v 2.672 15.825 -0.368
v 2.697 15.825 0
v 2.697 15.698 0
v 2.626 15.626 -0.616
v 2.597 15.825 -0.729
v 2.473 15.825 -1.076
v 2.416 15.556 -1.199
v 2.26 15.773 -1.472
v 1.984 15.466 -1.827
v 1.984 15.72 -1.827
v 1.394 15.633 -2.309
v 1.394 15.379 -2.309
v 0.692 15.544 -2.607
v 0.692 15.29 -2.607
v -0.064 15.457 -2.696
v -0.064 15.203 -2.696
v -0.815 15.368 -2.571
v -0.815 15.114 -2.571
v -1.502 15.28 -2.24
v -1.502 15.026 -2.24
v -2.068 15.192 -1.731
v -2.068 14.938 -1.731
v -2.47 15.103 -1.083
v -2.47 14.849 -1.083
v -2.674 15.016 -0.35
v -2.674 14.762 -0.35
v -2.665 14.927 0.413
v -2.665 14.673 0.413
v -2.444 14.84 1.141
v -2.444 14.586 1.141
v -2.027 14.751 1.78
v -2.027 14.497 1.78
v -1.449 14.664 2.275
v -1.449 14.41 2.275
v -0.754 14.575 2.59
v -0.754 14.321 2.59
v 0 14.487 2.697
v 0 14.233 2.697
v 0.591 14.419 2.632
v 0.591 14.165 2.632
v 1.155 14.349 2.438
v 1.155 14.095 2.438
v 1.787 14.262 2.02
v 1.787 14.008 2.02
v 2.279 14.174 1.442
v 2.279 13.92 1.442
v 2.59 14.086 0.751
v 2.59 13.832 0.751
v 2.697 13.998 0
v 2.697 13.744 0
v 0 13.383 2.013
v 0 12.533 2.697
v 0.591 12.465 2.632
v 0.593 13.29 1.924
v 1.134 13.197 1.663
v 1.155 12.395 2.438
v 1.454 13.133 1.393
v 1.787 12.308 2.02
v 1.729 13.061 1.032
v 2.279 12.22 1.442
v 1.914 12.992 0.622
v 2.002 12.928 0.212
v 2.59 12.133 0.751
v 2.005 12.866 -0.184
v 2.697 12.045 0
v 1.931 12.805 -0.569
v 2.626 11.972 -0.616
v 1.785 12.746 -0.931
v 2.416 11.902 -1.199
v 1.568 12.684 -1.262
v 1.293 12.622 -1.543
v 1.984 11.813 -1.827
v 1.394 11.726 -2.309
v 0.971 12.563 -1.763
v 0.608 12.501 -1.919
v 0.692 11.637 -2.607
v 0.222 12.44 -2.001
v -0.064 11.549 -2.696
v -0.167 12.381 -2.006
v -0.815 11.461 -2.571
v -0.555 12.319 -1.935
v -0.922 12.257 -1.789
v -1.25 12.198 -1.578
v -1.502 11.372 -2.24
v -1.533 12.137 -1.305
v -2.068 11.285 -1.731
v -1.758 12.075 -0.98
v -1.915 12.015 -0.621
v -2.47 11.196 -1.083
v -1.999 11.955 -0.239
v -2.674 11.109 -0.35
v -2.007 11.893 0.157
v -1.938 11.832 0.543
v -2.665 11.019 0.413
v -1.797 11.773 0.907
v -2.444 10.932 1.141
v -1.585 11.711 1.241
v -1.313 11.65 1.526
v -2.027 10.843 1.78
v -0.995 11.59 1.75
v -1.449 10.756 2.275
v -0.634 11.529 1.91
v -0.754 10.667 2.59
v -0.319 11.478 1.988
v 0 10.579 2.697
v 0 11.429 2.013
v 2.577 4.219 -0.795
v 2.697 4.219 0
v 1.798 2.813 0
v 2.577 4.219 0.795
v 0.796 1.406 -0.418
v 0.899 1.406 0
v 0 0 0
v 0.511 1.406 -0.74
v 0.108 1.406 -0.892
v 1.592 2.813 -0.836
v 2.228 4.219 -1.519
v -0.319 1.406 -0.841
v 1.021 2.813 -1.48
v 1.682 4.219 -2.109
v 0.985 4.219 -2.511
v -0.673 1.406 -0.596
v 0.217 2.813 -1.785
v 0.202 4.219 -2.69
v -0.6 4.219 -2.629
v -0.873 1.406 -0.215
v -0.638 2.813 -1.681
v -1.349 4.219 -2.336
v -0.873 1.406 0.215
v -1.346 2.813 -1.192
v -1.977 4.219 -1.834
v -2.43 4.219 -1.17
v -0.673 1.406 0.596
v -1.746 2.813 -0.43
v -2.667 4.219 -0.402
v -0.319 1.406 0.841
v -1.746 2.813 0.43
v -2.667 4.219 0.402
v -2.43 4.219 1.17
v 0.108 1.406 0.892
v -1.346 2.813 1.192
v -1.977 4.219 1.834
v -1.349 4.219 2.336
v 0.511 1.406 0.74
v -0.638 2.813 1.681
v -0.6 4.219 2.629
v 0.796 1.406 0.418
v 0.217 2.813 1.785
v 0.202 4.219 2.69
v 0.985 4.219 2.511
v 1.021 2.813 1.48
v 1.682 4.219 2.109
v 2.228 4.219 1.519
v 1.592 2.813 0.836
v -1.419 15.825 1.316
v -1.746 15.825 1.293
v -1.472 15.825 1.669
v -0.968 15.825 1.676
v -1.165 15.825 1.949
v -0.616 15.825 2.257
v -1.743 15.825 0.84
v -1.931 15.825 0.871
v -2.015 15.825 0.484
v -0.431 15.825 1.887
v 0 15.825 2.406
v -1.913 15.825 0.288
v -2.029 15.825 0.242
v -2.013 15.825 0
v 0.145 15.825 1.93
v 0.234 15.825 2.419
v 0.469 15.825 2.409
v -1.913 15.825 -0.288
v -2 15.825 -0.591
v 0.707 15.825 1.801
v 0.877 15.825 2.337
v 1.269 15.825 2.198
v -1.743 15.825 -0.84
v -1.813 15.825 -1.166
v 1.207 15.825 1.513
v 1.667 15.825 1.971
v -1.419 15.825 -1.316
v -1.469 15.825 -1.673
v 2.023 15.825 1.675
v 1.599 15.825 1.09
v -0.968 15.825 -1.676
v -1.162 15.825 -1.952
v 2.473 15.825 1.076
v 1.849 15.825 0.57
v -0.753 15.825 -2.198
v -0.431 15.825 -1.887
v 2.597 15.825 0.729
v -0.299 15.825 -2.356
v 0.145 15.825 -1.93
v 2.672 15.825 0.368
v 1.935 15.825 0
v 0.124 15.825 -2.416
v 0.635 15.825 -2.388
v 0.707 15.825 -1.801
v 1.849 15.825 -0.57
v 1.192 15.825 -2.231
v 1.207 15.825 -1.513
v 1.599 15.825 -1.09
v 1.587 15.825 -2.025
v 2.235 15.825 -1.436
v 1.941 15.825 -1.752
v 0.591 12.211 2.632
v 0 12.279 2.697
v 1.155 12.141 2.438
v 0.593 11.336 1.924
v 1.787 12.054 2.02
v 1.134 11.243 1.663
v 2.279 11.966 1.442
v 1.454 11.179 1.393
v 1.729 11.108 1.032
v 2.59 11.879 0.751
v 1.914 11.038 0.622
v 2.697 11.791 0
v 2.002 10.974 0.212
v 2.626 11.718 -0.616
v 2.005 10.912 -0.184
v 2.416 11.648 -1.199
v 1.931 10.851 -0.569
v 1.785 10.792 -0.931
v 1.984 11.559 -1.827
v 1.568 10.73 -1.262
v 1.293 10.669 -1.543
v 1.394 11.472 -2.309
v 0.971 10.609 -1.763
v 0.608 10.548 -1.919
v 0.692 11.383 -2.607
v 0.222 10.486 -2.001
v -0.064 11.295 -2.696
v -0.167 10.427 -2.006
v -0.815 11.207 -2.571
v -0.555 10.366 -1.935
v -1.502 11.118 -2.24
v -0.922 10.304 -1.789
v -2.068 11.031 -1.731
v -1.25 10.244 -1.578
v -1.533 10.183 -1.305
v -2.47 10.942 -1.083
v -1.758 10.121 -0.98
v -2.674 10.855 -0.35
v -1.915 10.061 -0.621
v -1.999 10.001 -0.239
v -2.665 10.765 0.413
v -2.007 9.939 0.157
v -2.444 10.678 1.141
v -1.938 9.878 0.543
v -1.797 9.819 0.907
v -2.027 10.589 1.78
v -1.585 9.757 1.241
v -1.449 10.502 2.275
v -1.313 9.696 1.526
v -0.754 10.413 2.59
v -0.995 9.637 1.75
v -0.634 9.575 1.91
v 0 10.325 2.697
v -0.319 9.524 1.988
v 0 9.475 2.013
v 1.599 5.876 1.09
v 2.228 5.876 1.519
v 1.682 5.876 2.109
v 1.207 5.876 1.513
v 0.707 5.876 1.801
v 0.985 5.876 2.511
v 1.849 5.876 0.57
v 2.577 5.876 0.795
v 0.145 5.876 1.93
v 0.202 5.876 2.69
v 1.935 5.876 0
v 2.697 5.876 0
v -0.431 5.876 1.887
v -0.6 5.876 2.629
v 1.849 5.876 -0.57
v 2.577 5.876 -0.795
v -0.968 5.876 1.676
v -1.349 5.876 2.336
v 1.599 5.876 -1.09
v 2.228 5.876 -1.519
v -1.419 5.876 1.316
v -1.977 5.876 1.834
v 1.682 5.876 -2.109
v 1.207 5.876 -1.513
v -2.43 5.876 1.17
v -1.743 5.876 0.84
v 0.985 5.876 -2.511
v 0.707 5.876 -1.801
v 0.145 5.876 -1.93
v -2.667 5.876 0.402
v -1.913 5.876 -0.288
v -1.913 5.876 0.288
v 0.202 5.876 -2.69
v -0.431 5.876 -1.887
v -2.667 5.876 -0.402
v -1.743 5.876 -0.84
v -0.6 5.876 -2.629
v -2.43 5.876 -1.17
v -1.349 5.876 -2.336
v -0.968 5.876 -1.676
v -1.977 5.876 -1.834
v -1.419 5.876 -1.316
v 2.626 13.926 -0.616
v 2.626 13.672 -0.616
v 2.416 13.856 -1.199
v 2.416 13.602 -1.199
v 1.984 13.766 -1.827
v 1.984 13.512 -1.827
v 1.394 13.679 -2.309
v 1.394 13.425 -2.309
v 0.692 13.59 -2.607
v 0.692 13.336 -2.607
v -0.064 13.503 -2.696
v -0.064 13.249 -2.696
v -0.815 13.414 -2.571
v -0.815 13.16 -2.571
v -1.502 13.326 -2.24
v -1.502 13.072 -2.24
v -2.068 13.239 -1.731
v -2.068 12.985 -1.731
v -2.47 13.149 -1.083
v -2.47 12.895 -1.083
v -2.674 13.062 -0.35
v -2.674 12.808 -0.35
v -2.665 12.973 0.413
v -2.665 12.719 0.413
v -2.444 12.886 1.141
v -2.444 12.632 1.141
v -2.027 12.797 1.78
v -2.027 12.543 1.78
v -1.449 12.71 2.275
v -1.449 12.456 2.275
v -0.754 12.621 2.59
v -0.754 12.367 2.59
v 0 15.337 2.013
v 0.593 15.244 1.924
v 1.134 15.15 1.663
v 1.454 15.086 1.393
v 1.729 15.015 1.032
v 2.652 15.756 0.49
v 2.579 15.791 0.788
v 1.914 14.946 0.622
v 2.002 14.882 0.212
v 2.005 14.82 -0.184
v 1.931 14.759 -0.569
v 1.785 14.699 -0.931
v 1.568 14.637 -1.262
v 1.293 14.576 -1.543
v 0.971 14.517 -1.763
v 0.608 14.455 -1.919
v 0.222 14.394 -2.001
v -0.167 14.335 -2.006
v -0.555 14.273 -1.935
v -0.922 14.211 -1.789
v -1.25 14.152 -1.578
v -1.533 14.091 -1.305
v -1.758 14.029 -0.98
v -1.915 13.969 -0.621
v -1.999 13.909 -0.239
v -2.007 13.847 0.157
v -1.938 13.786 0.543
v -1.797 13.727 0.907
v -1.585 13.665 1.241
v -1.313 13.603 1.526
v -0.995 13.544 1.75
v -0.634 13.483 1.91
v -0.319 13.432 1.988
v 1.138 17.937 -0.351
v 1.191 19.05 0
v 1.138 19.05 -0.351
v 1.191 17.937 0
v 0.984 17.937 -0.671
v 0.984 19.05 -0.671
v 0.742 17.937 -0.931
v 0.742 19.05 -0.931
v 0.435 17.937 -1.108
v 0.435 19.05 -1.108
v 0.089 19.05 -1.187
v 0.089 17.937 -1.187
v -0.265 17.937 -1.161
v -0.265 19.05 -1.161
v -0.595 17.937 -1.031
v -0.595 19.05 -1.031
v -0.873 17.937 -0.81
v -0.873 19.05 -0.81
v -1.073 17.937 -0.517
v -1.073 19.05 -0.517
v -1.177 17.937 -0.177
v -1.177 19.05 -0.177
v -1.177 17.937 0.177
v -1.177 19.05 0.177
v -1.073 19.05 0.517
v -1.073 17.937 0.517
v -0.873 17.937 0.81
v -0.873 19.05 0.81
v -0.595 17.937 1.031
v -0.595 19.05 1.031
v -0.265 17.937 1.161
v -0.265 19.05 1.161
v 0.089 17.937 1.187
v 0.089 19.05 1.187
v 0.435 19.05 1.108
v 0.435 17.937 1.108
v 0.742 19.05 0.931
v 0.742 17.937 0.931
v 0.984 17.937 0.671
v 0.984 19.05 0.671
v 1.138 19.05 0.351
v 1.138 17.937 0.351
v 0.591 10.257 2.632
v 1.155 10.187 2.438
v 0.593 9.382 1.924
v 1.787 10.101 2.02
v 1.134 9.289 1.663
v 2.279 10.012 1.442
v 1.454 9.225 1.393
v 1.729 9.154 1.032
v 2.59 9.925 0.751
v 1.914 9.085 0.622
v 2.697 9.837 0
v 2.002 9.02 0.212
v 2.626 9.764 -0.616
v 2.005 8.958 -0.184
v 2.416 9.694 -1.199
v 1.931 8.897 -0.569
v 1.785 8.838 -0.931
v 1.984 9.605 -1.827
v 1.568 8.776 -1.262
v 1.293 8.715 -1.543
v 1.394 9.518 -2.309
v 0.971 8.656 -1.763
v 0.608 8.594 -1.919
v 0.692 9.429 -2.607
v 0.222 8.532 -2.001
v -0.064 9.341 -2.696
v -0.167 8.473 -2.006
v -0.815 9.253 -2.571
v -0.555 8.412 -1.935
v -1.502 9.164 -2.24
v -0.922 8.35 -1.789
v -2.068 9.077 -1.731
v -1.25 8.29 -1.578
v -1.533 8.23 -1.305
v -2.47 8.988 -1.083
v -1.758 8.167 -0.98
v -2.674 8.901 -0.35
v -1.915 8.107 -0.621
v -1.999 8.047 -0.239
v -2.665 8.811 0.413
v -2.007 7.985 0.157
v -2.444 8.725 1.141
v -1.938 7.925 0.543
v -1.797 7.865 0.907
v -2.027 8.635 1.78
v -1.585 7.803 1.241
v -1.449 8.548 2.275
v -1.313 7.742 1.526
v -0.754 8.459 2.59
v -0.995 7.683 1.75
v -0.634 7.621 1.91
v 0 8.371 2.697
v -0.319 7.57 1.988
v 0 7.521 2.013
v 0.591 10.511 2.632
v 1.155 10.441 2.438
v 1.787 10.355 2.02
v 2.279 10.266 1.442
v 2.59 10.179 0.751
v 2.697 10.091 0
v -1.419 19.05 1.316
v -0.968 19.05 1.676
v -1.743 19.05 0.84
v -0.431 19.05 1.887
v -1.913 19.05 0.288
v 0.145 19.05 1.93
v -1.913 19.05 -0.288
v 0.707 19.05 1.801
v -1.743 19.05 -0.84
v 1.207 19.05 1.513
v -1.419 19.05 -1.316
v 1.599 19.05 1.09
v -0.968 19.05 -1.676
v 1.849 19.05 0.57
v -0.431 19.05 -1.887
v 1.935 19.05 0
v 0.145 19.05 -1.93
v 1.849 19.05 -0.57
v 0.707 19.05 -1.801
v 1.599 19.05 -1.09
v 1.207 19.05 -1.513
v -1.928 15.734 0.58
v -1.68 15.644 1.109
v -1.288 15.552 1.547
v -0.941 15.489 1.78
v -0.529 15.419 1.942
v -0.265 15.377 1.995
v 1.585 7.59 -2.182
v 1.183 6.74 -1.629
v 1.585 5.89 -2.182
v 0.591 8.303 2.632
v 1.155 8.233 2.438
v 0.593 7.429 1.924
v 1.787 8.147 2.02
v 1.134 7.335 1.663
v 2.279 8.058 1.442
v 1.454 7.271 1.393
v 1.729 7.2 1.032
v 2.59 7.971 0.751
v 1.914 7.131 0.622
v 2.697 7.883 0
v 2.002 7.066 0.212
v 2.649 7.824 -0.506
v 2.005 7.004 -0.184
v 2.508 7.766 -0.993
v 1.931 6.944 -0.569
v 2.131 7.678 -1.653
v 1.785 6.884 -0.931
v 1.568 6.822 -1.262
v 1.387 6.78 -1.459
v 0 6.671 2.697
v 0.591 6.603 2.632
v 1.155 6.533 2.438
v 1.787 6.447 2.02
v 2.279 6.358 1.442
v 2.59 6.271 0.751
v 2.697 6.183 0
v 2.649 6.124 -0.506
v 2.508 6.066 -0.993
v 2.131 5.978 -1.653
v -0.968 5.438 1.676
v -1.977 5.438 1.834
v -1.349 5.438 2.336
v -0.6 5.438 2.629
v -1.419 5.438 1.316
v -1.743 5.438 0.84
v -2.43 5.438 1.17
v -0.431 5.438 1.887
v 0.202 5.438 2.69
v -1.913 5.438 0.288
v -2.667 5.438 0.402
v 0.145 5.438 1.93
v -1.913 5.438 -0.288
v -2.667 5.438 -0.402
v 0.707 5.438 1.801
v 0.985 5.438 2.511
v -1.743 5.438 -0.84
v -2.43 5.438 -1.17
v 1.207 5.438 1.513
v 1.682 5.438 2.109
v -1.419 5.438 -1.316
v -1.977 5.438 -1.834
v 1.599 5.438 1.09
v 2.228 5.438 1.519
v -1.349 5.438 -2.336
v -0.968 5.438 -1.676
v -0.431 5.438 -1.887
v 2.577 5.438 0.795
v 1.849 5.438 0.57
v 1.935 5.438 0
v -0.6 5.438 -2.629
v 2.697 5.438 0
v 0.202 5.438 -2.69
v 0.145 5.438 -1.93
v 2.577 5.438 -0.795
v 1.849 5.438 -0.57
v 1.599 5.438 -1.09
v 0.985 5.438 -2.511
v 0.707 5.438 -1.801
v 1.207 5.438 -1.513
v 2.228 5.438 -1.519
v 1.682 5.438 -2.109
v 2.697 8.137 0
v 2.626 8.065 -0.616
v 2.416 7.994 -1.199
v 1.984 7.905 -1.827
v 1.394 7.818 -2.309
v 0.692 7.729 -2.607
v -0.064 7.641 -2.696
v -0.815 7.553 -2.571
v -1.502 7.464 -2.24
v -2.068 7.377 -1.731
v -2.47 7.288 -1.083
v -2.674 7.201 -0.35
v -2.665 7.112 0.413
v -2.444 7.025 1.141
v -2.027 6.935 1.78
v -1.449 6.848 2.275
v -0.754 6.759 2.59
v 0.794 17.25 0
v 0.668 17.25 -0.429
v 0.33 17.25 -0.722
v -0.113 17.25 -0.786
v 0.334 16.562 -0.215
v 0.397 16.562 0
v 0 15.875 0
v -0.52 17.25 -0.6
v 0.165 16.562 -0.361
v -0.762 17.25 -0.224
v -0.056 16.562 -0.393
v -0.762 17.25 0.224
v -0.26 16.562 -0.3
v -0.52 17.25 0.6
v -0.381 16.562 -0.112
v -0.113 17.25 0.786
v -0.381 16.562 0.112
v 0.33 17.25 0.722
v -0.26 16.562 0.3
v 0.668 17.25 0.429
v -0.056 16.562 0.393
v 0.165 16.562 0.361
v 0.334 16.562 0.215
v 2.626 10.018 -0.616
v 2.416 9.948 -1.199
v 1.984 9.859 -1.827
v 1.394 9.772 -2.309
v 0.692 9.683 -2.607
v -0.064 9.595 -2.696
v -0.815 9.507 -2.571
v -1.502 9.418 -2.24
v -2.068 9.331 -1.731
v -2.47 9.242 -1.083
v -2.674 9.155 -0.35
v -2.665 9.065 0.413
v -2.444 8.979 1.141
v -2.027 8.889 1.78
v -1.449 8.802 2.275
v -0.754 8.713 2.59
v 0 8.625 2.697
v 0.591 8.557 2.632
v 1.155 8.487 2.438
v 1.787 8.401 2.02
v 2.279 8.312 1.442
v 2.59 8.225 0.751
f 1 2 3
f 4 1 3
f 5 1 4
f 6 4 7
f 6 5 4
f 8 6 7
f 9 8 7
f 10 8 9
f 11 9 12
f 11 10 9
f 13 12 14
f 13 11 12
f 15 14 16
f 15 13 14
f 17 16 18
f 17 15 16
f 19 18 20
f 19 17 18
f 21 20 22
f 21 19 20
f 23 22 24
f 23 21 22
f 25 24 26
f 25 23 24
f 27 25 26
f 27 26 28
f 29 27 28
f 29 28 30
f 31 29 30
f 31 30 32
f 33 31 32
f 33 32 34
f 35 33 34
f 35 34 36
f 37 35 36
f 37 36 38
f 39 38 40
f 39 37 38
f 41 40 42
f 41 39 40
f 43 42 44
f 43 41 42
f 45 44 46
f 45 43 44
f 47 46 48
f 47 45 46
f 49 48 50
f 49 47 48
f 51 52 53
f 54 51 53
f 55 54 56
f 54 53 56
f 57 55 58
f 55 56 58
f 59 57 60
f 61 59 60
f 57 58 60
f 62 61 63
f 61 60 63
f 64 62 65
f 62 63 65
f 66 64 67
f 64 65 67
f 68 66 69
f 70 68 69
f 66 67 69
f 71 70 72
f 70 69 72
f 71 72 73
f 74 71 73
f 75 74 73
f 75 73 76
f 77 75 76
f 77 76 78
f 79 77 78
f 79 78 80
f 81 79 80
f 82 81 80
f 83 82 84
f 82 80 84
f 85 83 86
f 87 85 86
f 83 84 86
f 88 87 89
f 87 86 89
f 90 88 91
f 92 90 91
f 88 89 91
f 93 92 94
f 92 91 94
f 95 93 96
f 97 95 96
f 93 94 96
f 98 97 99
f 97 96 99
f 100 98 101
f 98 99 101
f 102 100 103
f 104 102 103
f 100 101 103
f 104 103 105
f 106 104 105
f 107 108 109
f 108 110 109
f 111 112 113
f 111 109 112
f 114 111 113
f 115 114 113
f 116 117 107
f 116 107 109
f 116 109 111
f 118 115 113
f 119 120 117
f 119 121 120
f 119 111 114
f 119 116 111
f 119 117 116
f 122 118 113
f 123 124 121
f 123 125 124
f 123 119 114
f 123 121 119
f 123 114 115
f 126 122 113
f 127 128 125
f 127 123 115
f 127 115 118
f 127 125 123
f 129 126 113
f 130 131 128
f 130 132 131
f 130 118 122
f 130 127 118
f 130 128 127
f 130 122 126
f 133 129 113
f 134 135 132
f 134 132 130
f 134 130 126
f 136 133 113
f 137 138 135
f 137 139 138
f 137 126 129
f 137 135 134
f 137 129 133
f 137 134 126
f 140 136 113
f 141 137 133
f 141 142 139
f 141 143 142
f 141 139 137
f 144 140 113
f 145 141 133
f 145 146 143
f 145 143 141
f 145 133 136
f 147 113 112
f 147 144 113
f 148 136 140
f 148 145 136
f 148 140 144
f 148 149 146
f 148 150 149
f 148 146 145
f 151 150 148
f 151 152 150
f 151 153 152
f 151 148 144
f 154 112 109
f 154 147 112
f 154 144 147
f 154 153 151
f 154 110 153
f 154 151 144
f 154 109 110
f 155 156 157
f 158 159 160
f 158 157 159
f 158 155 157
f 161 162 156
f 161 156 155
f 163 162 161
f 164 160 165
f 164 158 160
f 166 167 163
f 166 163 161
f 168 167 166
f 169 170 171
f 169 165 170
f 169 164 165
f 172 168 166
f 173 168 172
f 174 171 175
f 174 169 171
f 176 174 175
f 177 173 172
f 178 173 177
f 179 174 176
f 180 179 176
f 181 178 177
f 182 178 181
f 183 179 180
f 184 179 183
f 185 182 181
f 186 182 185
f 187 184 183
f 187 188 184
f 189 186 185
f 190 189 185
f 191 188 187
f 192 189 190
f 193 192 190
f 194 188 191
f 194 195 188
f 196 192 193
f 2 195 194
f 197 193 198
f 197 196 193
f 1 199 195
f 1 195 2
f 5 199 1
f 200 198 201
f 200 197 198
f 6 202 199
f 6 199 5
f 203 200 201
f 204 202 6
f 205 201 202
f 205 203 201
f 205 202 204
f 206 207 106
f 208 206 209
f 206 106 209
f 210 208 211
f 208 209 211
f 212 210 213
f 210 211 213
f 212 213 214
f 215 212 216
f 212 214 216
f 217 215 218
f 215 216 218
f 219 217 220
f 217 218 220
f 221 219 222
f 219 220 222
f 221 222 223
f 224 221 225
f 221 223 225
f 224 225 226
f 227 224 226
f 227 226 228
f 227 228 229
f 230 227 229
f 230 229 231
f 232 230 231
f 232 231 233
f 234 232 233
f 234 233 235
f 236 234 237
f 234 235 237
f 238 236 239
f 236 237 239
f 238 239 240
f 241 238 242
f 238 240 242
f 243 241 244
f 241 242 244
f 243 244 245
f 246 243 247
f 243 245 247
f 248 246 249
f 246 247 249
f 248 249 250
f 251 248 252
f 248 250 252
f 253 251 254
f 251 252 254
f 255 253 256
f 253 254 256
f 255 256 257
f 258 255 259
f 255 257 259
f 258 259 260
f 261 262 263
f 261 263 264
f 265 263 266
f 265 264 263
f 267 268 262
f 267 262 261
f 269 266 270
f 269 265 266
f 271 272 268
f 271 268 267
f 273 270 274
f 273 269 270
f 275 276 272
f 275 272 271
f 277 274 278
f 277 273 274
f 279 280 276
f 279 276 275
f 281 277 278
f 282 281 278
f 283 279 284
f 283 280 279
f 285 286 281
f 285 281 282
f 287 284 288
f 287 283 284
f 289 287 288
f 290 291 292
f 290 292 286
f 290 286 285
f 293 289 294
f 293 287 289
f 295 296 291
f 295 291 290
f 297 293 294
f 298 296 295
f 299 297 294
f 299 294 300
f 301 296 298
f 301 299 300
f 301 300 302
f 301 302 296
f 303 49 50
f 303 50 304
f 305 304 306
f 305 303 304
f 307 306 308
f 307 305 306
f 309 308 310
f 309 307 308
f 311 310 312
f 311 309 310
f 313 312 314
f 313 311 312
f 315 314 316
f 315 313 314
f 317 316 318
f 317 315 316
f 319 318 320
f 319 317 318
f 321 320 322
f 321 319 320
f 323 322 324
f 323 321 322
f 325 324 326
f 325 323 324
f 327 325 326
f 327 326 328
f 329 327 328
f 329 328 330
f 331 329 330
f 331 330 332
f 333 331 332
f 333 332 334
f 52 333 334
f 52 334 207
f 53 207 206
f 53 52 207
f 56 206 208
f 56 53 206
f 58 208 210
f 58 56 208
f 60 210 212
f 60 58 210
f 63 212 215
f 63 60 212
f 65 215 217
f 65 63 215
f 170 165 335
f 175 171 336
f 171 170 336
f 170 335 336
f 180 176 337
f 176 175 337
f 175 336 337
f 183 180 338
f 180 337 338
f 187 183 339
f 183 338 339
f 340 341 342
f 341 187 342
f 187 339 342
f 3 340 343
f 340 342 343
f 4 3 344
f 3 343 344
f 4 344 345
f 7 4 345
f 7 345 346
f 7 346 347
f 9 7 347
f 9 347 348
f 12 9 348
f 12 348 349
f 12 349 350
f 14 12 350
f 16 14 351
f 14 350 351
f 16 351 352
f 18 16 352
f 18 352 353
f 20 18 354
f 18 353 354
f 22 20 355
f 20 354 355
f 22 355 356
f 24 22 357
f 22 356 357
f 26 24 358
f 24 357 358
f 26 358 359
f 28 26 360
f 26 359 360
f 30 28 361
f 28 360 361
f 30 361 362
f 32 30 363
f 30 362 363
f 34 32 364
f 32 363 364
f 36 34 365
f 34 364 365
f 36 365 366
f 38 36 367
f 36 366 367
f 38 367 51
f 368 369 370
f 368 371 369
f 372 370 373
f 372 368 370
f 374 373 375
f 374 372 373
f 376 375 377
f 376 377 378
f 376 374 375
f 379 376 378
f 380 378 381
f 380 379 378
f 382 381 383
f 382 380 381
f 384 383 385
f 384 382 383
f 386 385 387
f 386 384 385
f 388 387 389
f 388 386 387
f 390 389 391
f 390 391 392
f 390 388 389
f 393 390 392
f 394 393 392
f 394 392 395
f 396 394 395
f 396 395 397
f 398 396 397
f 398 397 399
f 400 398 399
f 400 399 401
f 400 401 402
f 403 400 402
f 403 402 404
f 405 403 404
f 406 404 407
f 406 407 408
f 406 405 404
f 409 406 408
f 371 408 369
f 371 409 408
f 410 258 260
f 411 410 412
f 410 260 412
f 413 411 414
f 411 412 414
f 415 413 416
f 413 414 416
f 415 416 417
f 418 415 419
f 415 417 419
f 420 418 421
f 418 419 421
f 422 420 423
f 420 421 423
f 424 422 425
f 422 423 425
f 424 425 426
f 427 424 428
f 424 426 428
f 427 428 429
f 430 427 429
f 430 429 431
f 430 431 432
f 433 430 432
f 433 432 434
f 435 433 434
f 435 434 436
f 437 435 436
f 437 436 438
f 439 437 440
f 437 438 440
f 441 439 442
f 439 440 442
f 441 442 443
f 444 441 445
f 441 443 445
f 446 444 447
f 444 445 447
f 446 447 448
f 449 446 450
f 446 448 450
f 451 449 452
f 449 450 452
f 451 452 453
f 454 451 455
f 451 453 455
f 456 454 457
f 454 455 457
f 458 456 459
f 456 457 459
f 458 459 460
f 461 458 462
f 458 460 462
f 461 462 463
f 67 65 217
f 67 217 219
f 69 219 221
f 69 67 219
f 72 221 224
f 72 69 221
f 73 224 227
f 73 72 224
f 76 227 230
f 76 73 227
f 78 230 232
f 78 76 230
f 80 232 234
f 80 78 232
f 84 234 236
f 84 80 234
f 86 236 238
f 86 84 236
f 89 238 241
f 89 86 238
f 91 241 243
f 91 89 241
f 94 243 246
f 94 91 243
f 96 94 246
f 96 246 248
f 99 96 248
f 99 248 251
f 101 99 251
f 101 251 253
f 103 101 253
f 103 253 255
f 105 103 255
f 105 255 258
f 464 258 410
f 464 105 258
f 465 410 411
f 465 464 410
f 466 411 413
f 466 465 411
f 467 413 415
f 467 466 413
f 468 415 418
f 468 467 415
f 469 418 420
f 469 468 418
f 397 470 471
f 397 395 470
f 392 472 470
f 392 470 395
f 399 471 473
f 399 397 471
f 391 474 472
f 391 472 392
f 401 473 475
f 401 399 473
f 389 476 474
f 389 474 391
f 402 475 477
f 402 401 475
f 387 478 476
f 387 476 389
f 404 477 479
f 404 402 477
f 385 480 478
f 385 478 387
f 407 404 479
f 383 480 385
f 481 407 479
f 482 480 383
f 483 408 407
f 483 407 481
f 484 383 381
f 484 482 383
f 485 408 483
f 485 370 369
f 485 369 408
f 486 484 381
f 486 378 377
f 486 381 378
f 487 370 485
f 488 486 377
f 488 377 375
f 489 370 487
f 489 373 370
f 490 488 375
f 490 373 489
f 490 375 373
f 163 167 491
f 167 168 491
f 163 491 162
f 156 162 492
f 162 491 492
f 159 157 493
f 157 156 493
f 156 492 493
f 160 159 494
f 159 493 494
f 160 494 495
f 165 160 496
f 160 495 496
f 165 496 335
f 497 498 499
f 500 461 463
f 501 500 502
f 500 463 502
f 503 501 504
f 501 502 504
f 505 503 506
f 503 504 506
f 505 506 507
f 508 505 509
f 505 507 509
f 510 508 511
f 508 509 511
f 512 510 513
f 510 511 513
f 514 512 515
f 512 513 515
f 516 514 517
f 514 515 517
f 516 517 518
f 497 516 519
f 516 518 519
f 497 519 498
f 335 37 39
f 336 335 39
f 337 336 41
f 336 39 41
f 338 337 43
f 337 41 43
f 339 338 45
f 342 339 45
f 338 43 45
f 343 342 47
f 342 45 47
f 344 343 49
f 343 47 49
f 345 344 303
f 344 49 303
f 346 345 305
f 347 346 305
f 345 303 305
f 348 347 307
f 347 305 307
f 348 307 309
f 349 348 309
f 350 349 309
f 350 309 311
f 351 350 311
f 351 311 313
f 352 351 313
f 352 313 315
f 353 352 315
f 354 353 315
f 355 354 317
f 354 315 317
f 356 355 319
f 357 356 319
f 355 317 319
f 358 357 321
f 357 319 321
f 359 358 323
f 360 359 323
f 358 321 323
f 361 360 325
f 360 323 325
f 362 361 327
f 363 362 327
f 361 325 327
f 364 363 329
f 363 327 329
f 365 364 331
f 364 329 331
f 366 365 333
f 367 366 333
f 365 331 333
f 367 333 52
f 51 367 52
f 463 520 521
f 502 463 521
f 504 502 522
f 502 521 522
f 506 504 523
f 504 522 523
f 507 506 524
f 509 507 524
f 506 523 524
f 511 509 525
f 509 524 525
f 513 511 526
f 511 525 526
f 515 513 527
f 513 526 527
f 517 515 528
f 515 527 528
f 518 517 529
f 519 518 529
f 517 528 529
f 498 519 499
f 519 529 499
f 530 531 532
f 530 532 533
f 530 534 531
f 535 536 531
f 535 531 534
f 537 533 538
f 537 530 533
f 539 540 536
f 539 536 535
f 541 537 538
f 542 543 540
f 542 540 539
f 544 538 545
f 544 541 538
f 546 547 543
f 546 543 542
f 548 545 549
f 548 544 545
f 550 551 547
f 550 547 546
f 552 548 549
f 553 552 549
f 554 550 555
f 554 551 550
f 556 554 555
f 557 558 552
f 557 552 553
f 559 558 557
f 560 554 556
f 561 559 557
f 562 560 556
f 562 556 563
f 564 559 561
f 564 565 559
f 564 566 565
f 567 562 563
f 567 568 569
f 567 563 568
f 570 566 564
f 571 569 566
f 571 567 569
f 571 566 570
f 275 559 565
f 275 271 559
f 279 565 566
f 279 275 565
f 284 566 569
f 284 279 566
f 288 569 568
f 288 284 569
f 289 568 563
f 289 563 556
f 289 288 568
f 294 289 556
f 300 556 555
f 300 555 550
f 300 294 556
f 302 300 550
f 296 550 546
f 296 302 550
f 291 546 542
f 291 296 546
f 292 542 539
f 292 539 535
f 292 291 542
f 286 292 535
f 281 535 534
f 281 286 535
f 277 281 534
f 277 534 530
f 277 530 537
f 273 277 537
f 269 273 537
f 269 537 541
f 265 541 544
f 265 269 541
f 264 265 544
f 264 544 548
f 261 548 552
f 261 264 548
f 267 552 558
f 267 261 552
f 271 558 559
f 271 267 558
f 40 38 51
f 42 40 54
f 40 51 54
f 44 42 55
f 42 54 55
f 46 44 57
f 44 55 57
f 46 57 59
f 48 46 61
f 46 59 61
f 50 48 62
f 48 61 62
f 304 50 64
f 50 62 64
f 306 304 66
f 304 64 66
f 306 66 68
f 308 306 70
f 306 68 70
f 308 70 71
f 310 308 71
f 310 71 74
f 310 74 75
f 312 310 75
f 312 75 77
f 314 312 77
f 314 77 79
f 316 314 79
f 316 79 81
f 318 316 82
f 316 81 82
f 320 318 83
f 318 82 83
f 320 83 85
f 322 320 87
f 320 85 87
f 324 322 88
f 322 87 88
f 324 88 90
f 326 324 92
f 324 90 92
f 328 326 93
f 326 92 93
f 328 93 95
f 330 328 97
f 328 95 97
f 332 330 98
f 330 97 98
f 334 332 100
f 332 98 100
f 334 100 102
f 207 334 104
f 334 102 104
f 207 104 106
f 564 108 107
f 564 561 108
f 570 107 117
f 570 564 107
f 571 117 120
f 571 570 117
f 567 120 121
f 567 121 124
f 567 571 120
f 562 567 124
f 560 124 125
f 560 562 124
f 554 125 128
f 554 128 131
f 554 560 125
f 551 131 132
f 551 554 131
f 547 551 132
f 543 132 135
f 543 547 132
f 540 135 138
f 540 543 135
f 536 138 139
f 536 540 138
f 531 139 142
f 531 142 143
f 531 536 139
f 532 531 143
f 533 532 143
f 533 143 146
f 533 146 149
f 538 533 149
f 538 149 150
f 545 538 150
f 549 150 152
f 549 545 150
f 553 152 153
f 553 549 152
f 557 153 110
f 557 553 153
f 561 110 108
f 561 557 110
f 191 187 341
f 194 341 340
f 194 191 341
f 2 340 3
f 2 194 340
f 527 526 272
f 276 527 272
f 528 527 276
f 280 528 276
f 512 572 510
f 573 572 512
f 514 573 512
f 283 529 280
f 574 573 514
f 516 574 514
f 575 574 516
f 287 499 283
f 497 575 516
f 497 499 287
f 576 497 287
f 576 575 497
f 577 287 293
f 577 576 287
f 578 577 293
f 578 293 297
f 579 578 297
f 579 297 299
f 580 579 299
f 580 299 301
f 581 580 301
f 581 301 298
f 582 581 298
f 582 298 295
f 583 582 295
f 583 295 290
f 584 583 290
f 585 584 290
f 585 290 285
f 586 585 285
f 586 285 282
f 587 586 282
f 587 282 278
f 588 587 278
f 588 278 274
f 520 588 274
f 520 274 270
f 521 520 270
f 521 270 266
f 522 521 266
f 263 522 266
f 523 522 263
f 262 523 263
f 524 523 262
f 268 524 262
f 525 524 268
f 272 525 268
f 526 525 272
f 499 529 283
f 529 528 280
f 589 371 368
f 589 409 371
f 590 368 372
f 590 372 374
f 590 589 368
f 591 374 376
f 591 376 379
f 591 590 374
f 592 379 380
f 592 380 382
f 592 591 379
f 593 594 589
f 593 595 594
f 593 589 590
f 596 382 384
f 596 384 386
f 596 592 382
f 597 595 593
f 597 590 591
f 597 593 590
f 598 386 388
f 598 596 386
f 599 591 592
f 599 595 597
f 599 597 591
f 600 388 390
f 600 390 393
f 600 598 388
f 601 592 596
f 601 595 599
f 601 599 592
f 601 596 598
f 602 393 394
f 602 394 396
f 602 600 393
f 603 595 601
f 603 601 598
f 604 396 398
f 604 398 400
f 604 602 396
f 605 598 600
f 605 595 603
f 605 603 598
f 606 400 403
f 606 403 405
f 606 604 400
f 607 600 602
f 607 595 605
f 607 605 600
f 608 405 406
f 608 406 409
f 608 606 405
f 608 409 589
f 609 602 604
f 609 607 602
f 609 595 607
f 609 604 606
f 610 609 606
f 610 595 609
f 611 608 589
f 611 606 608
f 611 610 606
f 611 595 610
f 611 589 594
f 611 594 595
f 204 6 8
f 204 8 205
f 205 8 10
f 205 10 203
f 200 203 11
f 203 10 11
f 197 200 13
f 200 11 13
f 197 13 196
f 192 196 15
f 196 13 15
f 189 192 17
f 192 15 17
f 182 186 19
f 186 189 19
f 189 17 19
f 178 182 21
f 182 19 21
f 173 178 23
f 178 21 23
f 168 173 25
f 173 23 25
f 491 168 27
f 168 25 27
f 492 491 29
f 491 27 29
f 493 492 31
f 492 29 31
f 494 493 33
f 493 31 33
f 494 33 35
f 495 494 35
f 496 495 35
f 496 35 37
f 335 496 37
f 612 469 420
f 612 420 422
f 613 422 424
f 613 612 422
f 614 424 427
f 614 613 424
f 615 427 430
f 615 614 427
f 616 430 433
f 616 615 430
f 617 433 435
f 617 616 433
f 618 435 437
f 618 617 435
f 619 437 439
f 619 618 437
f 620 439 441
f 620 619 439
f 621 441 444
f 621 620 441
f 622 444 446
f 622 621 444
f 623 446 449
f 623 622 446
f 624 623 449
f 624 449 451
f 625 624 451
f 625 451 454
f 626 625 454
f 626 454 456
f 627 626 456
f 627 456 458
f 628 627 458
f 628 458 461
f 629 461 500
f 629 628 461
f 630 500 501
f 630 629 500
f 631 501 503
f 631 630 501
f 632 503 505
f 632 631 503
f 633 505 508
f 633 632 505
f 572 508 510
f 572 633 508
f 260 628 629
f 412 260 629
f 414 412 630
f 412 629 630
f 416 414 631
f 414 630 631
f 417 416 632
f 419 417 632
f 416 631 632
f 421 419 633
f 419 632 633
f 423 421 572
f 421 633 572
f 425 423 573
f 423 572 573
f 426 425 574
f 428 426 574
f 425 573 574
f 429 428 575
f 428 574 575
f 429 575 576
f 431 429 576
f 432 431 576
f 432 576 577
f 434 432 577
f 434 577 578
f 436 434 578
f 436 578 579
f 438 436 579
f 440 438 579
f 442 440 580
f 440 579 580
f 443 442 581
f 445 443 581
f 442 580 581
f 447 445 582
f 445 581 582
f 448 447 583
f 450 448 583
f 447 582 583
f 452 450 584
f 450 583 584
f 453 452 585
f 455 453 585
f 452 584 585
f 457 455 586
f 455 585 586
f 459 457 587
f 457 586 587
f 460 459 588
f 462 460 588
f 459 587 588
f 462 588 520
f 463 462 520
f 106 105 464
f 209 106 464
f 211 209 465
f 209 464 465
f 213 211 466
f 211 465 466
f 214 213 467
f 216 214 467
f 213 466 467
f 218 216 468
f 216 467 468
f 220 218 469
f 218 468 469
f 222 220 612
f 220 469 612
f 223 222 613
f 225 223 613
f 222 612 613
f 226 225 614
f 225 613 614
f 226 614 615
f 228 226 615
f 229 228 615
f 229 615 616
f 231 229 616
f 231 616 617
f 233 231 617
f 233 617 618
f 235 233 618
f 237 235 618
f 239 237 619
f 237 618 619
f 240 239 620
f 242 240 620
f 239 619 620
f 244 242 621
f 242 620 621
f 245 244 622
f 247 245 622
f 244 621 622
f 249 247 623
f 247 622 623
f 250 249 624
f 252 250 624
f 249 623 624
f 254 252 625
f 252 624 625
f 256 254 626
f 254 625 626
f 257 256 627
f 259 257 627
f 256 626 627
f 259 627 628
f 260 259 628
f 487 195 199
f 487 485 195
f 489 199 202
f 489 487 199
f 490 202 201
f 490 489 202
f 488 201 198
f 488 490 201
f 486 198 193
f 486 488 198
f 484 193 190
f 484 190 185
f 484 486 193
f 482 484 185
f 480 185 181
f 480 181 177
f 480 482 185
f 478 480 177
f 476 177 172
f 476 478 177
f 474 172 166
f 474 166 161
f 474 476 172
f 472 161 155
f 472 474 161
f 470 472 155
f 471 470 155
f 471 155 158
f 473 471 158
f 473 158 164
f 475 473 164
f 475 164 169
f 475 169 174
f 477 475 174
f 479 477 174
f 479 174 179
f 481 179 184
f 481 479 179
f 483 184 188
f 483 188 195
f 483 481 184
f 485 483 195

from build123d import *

# Parameters (mm, degrees)
CUT_SWEEP9_PITCH = 1.953846154


with BuildPart() as part:
    # Sketch1 → Revolve1 (revolve)
    with BuildSketch(Plane.XY):
        Polygon((0, 0), (2.697104334, 4.218980763), (2.697104334, 5.438459147), (1.935104334, 5.438459147), (1.935104334, 5.875667474), (2.697104334, 5.875667474), (2.697104334, 15.825259324), (1.935104334, 15.825259324), (1.935104334, 19.05), (1.190625, 19.05), (1.190625, 17.937222993), (0, 15.875), align=None)
    revolve(axis=Axis((0, 0, 0), (0, 1, 0)))

    # Cut-Sweep9: arcs per turn and ends read off the stored shape
    # Cut-Sweep9: the profile of Sketch4 profile screwed along a left-hand helix through 5.4 turns, 10 arcs to a turn; built about Z, then put on its axis
    cut_sweep9_z = Axis((0, 0, 0), (0, 0, 1))
    cut_sweep9_corners = [(2.012993376, -5.973e-06, -1.465383693), (2.697404334, -8.003e-06, -0.615087903), (2.697404334, -8.003e-06, -2.315679482)]
    with BuildLine(mode=Mode.PRIVATE) as cut_sweep9_profile:
        Line(cut_sweep9_corners[0], cut_sweep9_corners[1])
        Line(cut_sweep9_corners[1], cut_sweep9_corners[2])
        Line(cut_sweep9_corners[2], cut_sweep9_corners[0])
    cut_sweep9_cap = Face(cut_sweep9_profile.wire())
    cut_sweep9_turn_angles = [0, -18, -36, -54, -72, -90, -108, -126, -144, -162, -180, -198, -216, -234, -252, -270, -288, -306, -324, -342, -360]
    cut_sweep9_turn_weights = [1, 0.9510565162951535, 1, 0.9510565162951535, 1, 0.9510565162951535, 1, 0.9510565162951535, 1, 0.9510565162951535, 1, 0.9510565162951535, 1, 0.9510565162951535, 1, 0.9510565162951535, 1, 0.9510565162951535, 1, 0.9510565162951535, 1]
    cut_sweep9_turn_rails = [Edge.make_bspline([Vector(p[0], p[1], 0).rotate(cut_sweep9_z, cut_sweep9_turn_angles[k]) / cut_sweep9_turn_weights[k] + Vector(0, 0, p[2] + -CUT_SWEEP9_PITCH * cut_sweep9_turn_angles[k] / 360) for k in range(21)], [0, 0, 0, 1, 1, 2, 2, 3, 3, 4, 4, 5, 5, 6, 6, 7, 7, 8, 8, 9, 9, 10, 10, 10], 2, cut_sweep9_turn_weights) for p in cut_sweep9_corners]
    cut_sweep9_turn_sides = [Face.make_surface_from_curves(cut_sweep9_turn_rails[p[0]], cut_sweep9_turn_rails[p[1]]) for p in [(0, 1), (1, 2), (2, 0)]]
    cut_sweep9_last_angles = [-1800, -1818, -1836, -1854, -1872, -1890, -1908, -1926, -1944]
    cut_sweep9_last_weights = [1, 0.9510565162951535, 1, 0.9510565162951535, 1, 0.9510565162951535, 1, 0.9510565162951382, 1]
    cut_sweep9_last_rails = [Edge.make_bspline([Vector(p[0], p[1], 0).rotate(cut_sweep9_z, cut_sweep9_last_angles[k]) / cut_sweep9_last_weights[k] + Vector(0, 0, p[2] + -CUT_SWEEP9_PITCH * cut_sweep9_last_angles[k] / 360) for k in range(9)], [0, 0, 0, 1, 1, 2, 2, 3, 3, 4, 4, 4], 2, cut_sweep9_last_weights) for p in cut_sweep9_corners]
    cut_sweep9_last_sides = [Face.make_surface_from_curves(cut_sweep9_last_rails[p[0]], cut_sweep9_last_rails[p[1]]) for p in [(0, 1), (1, 2), (2, 0)]]
    cut_sweep9 = Plane(origin=(0, 15.825259324, 0), x_dir=(0, 0, 1), z_dir=(0, -1, 0)) * Solid(Shell([*[p.moved(Location((0, 0, CUT_SWEEP9_PITCH * i))) for i in range(5) for p in cut_sweep9_turn_sides], *cut_sweep9_last_sides, cut_sweep9_cap, cut_sweep9_cap.rotate(cut_sweep9_z, -1944).moved(Location((0, 0, -CUT_SWEEP9_PITCH * -1944 / 360)))]))
    add(cut_sweep9, mode=Mode.SUBTRACT)


solid = part.part
